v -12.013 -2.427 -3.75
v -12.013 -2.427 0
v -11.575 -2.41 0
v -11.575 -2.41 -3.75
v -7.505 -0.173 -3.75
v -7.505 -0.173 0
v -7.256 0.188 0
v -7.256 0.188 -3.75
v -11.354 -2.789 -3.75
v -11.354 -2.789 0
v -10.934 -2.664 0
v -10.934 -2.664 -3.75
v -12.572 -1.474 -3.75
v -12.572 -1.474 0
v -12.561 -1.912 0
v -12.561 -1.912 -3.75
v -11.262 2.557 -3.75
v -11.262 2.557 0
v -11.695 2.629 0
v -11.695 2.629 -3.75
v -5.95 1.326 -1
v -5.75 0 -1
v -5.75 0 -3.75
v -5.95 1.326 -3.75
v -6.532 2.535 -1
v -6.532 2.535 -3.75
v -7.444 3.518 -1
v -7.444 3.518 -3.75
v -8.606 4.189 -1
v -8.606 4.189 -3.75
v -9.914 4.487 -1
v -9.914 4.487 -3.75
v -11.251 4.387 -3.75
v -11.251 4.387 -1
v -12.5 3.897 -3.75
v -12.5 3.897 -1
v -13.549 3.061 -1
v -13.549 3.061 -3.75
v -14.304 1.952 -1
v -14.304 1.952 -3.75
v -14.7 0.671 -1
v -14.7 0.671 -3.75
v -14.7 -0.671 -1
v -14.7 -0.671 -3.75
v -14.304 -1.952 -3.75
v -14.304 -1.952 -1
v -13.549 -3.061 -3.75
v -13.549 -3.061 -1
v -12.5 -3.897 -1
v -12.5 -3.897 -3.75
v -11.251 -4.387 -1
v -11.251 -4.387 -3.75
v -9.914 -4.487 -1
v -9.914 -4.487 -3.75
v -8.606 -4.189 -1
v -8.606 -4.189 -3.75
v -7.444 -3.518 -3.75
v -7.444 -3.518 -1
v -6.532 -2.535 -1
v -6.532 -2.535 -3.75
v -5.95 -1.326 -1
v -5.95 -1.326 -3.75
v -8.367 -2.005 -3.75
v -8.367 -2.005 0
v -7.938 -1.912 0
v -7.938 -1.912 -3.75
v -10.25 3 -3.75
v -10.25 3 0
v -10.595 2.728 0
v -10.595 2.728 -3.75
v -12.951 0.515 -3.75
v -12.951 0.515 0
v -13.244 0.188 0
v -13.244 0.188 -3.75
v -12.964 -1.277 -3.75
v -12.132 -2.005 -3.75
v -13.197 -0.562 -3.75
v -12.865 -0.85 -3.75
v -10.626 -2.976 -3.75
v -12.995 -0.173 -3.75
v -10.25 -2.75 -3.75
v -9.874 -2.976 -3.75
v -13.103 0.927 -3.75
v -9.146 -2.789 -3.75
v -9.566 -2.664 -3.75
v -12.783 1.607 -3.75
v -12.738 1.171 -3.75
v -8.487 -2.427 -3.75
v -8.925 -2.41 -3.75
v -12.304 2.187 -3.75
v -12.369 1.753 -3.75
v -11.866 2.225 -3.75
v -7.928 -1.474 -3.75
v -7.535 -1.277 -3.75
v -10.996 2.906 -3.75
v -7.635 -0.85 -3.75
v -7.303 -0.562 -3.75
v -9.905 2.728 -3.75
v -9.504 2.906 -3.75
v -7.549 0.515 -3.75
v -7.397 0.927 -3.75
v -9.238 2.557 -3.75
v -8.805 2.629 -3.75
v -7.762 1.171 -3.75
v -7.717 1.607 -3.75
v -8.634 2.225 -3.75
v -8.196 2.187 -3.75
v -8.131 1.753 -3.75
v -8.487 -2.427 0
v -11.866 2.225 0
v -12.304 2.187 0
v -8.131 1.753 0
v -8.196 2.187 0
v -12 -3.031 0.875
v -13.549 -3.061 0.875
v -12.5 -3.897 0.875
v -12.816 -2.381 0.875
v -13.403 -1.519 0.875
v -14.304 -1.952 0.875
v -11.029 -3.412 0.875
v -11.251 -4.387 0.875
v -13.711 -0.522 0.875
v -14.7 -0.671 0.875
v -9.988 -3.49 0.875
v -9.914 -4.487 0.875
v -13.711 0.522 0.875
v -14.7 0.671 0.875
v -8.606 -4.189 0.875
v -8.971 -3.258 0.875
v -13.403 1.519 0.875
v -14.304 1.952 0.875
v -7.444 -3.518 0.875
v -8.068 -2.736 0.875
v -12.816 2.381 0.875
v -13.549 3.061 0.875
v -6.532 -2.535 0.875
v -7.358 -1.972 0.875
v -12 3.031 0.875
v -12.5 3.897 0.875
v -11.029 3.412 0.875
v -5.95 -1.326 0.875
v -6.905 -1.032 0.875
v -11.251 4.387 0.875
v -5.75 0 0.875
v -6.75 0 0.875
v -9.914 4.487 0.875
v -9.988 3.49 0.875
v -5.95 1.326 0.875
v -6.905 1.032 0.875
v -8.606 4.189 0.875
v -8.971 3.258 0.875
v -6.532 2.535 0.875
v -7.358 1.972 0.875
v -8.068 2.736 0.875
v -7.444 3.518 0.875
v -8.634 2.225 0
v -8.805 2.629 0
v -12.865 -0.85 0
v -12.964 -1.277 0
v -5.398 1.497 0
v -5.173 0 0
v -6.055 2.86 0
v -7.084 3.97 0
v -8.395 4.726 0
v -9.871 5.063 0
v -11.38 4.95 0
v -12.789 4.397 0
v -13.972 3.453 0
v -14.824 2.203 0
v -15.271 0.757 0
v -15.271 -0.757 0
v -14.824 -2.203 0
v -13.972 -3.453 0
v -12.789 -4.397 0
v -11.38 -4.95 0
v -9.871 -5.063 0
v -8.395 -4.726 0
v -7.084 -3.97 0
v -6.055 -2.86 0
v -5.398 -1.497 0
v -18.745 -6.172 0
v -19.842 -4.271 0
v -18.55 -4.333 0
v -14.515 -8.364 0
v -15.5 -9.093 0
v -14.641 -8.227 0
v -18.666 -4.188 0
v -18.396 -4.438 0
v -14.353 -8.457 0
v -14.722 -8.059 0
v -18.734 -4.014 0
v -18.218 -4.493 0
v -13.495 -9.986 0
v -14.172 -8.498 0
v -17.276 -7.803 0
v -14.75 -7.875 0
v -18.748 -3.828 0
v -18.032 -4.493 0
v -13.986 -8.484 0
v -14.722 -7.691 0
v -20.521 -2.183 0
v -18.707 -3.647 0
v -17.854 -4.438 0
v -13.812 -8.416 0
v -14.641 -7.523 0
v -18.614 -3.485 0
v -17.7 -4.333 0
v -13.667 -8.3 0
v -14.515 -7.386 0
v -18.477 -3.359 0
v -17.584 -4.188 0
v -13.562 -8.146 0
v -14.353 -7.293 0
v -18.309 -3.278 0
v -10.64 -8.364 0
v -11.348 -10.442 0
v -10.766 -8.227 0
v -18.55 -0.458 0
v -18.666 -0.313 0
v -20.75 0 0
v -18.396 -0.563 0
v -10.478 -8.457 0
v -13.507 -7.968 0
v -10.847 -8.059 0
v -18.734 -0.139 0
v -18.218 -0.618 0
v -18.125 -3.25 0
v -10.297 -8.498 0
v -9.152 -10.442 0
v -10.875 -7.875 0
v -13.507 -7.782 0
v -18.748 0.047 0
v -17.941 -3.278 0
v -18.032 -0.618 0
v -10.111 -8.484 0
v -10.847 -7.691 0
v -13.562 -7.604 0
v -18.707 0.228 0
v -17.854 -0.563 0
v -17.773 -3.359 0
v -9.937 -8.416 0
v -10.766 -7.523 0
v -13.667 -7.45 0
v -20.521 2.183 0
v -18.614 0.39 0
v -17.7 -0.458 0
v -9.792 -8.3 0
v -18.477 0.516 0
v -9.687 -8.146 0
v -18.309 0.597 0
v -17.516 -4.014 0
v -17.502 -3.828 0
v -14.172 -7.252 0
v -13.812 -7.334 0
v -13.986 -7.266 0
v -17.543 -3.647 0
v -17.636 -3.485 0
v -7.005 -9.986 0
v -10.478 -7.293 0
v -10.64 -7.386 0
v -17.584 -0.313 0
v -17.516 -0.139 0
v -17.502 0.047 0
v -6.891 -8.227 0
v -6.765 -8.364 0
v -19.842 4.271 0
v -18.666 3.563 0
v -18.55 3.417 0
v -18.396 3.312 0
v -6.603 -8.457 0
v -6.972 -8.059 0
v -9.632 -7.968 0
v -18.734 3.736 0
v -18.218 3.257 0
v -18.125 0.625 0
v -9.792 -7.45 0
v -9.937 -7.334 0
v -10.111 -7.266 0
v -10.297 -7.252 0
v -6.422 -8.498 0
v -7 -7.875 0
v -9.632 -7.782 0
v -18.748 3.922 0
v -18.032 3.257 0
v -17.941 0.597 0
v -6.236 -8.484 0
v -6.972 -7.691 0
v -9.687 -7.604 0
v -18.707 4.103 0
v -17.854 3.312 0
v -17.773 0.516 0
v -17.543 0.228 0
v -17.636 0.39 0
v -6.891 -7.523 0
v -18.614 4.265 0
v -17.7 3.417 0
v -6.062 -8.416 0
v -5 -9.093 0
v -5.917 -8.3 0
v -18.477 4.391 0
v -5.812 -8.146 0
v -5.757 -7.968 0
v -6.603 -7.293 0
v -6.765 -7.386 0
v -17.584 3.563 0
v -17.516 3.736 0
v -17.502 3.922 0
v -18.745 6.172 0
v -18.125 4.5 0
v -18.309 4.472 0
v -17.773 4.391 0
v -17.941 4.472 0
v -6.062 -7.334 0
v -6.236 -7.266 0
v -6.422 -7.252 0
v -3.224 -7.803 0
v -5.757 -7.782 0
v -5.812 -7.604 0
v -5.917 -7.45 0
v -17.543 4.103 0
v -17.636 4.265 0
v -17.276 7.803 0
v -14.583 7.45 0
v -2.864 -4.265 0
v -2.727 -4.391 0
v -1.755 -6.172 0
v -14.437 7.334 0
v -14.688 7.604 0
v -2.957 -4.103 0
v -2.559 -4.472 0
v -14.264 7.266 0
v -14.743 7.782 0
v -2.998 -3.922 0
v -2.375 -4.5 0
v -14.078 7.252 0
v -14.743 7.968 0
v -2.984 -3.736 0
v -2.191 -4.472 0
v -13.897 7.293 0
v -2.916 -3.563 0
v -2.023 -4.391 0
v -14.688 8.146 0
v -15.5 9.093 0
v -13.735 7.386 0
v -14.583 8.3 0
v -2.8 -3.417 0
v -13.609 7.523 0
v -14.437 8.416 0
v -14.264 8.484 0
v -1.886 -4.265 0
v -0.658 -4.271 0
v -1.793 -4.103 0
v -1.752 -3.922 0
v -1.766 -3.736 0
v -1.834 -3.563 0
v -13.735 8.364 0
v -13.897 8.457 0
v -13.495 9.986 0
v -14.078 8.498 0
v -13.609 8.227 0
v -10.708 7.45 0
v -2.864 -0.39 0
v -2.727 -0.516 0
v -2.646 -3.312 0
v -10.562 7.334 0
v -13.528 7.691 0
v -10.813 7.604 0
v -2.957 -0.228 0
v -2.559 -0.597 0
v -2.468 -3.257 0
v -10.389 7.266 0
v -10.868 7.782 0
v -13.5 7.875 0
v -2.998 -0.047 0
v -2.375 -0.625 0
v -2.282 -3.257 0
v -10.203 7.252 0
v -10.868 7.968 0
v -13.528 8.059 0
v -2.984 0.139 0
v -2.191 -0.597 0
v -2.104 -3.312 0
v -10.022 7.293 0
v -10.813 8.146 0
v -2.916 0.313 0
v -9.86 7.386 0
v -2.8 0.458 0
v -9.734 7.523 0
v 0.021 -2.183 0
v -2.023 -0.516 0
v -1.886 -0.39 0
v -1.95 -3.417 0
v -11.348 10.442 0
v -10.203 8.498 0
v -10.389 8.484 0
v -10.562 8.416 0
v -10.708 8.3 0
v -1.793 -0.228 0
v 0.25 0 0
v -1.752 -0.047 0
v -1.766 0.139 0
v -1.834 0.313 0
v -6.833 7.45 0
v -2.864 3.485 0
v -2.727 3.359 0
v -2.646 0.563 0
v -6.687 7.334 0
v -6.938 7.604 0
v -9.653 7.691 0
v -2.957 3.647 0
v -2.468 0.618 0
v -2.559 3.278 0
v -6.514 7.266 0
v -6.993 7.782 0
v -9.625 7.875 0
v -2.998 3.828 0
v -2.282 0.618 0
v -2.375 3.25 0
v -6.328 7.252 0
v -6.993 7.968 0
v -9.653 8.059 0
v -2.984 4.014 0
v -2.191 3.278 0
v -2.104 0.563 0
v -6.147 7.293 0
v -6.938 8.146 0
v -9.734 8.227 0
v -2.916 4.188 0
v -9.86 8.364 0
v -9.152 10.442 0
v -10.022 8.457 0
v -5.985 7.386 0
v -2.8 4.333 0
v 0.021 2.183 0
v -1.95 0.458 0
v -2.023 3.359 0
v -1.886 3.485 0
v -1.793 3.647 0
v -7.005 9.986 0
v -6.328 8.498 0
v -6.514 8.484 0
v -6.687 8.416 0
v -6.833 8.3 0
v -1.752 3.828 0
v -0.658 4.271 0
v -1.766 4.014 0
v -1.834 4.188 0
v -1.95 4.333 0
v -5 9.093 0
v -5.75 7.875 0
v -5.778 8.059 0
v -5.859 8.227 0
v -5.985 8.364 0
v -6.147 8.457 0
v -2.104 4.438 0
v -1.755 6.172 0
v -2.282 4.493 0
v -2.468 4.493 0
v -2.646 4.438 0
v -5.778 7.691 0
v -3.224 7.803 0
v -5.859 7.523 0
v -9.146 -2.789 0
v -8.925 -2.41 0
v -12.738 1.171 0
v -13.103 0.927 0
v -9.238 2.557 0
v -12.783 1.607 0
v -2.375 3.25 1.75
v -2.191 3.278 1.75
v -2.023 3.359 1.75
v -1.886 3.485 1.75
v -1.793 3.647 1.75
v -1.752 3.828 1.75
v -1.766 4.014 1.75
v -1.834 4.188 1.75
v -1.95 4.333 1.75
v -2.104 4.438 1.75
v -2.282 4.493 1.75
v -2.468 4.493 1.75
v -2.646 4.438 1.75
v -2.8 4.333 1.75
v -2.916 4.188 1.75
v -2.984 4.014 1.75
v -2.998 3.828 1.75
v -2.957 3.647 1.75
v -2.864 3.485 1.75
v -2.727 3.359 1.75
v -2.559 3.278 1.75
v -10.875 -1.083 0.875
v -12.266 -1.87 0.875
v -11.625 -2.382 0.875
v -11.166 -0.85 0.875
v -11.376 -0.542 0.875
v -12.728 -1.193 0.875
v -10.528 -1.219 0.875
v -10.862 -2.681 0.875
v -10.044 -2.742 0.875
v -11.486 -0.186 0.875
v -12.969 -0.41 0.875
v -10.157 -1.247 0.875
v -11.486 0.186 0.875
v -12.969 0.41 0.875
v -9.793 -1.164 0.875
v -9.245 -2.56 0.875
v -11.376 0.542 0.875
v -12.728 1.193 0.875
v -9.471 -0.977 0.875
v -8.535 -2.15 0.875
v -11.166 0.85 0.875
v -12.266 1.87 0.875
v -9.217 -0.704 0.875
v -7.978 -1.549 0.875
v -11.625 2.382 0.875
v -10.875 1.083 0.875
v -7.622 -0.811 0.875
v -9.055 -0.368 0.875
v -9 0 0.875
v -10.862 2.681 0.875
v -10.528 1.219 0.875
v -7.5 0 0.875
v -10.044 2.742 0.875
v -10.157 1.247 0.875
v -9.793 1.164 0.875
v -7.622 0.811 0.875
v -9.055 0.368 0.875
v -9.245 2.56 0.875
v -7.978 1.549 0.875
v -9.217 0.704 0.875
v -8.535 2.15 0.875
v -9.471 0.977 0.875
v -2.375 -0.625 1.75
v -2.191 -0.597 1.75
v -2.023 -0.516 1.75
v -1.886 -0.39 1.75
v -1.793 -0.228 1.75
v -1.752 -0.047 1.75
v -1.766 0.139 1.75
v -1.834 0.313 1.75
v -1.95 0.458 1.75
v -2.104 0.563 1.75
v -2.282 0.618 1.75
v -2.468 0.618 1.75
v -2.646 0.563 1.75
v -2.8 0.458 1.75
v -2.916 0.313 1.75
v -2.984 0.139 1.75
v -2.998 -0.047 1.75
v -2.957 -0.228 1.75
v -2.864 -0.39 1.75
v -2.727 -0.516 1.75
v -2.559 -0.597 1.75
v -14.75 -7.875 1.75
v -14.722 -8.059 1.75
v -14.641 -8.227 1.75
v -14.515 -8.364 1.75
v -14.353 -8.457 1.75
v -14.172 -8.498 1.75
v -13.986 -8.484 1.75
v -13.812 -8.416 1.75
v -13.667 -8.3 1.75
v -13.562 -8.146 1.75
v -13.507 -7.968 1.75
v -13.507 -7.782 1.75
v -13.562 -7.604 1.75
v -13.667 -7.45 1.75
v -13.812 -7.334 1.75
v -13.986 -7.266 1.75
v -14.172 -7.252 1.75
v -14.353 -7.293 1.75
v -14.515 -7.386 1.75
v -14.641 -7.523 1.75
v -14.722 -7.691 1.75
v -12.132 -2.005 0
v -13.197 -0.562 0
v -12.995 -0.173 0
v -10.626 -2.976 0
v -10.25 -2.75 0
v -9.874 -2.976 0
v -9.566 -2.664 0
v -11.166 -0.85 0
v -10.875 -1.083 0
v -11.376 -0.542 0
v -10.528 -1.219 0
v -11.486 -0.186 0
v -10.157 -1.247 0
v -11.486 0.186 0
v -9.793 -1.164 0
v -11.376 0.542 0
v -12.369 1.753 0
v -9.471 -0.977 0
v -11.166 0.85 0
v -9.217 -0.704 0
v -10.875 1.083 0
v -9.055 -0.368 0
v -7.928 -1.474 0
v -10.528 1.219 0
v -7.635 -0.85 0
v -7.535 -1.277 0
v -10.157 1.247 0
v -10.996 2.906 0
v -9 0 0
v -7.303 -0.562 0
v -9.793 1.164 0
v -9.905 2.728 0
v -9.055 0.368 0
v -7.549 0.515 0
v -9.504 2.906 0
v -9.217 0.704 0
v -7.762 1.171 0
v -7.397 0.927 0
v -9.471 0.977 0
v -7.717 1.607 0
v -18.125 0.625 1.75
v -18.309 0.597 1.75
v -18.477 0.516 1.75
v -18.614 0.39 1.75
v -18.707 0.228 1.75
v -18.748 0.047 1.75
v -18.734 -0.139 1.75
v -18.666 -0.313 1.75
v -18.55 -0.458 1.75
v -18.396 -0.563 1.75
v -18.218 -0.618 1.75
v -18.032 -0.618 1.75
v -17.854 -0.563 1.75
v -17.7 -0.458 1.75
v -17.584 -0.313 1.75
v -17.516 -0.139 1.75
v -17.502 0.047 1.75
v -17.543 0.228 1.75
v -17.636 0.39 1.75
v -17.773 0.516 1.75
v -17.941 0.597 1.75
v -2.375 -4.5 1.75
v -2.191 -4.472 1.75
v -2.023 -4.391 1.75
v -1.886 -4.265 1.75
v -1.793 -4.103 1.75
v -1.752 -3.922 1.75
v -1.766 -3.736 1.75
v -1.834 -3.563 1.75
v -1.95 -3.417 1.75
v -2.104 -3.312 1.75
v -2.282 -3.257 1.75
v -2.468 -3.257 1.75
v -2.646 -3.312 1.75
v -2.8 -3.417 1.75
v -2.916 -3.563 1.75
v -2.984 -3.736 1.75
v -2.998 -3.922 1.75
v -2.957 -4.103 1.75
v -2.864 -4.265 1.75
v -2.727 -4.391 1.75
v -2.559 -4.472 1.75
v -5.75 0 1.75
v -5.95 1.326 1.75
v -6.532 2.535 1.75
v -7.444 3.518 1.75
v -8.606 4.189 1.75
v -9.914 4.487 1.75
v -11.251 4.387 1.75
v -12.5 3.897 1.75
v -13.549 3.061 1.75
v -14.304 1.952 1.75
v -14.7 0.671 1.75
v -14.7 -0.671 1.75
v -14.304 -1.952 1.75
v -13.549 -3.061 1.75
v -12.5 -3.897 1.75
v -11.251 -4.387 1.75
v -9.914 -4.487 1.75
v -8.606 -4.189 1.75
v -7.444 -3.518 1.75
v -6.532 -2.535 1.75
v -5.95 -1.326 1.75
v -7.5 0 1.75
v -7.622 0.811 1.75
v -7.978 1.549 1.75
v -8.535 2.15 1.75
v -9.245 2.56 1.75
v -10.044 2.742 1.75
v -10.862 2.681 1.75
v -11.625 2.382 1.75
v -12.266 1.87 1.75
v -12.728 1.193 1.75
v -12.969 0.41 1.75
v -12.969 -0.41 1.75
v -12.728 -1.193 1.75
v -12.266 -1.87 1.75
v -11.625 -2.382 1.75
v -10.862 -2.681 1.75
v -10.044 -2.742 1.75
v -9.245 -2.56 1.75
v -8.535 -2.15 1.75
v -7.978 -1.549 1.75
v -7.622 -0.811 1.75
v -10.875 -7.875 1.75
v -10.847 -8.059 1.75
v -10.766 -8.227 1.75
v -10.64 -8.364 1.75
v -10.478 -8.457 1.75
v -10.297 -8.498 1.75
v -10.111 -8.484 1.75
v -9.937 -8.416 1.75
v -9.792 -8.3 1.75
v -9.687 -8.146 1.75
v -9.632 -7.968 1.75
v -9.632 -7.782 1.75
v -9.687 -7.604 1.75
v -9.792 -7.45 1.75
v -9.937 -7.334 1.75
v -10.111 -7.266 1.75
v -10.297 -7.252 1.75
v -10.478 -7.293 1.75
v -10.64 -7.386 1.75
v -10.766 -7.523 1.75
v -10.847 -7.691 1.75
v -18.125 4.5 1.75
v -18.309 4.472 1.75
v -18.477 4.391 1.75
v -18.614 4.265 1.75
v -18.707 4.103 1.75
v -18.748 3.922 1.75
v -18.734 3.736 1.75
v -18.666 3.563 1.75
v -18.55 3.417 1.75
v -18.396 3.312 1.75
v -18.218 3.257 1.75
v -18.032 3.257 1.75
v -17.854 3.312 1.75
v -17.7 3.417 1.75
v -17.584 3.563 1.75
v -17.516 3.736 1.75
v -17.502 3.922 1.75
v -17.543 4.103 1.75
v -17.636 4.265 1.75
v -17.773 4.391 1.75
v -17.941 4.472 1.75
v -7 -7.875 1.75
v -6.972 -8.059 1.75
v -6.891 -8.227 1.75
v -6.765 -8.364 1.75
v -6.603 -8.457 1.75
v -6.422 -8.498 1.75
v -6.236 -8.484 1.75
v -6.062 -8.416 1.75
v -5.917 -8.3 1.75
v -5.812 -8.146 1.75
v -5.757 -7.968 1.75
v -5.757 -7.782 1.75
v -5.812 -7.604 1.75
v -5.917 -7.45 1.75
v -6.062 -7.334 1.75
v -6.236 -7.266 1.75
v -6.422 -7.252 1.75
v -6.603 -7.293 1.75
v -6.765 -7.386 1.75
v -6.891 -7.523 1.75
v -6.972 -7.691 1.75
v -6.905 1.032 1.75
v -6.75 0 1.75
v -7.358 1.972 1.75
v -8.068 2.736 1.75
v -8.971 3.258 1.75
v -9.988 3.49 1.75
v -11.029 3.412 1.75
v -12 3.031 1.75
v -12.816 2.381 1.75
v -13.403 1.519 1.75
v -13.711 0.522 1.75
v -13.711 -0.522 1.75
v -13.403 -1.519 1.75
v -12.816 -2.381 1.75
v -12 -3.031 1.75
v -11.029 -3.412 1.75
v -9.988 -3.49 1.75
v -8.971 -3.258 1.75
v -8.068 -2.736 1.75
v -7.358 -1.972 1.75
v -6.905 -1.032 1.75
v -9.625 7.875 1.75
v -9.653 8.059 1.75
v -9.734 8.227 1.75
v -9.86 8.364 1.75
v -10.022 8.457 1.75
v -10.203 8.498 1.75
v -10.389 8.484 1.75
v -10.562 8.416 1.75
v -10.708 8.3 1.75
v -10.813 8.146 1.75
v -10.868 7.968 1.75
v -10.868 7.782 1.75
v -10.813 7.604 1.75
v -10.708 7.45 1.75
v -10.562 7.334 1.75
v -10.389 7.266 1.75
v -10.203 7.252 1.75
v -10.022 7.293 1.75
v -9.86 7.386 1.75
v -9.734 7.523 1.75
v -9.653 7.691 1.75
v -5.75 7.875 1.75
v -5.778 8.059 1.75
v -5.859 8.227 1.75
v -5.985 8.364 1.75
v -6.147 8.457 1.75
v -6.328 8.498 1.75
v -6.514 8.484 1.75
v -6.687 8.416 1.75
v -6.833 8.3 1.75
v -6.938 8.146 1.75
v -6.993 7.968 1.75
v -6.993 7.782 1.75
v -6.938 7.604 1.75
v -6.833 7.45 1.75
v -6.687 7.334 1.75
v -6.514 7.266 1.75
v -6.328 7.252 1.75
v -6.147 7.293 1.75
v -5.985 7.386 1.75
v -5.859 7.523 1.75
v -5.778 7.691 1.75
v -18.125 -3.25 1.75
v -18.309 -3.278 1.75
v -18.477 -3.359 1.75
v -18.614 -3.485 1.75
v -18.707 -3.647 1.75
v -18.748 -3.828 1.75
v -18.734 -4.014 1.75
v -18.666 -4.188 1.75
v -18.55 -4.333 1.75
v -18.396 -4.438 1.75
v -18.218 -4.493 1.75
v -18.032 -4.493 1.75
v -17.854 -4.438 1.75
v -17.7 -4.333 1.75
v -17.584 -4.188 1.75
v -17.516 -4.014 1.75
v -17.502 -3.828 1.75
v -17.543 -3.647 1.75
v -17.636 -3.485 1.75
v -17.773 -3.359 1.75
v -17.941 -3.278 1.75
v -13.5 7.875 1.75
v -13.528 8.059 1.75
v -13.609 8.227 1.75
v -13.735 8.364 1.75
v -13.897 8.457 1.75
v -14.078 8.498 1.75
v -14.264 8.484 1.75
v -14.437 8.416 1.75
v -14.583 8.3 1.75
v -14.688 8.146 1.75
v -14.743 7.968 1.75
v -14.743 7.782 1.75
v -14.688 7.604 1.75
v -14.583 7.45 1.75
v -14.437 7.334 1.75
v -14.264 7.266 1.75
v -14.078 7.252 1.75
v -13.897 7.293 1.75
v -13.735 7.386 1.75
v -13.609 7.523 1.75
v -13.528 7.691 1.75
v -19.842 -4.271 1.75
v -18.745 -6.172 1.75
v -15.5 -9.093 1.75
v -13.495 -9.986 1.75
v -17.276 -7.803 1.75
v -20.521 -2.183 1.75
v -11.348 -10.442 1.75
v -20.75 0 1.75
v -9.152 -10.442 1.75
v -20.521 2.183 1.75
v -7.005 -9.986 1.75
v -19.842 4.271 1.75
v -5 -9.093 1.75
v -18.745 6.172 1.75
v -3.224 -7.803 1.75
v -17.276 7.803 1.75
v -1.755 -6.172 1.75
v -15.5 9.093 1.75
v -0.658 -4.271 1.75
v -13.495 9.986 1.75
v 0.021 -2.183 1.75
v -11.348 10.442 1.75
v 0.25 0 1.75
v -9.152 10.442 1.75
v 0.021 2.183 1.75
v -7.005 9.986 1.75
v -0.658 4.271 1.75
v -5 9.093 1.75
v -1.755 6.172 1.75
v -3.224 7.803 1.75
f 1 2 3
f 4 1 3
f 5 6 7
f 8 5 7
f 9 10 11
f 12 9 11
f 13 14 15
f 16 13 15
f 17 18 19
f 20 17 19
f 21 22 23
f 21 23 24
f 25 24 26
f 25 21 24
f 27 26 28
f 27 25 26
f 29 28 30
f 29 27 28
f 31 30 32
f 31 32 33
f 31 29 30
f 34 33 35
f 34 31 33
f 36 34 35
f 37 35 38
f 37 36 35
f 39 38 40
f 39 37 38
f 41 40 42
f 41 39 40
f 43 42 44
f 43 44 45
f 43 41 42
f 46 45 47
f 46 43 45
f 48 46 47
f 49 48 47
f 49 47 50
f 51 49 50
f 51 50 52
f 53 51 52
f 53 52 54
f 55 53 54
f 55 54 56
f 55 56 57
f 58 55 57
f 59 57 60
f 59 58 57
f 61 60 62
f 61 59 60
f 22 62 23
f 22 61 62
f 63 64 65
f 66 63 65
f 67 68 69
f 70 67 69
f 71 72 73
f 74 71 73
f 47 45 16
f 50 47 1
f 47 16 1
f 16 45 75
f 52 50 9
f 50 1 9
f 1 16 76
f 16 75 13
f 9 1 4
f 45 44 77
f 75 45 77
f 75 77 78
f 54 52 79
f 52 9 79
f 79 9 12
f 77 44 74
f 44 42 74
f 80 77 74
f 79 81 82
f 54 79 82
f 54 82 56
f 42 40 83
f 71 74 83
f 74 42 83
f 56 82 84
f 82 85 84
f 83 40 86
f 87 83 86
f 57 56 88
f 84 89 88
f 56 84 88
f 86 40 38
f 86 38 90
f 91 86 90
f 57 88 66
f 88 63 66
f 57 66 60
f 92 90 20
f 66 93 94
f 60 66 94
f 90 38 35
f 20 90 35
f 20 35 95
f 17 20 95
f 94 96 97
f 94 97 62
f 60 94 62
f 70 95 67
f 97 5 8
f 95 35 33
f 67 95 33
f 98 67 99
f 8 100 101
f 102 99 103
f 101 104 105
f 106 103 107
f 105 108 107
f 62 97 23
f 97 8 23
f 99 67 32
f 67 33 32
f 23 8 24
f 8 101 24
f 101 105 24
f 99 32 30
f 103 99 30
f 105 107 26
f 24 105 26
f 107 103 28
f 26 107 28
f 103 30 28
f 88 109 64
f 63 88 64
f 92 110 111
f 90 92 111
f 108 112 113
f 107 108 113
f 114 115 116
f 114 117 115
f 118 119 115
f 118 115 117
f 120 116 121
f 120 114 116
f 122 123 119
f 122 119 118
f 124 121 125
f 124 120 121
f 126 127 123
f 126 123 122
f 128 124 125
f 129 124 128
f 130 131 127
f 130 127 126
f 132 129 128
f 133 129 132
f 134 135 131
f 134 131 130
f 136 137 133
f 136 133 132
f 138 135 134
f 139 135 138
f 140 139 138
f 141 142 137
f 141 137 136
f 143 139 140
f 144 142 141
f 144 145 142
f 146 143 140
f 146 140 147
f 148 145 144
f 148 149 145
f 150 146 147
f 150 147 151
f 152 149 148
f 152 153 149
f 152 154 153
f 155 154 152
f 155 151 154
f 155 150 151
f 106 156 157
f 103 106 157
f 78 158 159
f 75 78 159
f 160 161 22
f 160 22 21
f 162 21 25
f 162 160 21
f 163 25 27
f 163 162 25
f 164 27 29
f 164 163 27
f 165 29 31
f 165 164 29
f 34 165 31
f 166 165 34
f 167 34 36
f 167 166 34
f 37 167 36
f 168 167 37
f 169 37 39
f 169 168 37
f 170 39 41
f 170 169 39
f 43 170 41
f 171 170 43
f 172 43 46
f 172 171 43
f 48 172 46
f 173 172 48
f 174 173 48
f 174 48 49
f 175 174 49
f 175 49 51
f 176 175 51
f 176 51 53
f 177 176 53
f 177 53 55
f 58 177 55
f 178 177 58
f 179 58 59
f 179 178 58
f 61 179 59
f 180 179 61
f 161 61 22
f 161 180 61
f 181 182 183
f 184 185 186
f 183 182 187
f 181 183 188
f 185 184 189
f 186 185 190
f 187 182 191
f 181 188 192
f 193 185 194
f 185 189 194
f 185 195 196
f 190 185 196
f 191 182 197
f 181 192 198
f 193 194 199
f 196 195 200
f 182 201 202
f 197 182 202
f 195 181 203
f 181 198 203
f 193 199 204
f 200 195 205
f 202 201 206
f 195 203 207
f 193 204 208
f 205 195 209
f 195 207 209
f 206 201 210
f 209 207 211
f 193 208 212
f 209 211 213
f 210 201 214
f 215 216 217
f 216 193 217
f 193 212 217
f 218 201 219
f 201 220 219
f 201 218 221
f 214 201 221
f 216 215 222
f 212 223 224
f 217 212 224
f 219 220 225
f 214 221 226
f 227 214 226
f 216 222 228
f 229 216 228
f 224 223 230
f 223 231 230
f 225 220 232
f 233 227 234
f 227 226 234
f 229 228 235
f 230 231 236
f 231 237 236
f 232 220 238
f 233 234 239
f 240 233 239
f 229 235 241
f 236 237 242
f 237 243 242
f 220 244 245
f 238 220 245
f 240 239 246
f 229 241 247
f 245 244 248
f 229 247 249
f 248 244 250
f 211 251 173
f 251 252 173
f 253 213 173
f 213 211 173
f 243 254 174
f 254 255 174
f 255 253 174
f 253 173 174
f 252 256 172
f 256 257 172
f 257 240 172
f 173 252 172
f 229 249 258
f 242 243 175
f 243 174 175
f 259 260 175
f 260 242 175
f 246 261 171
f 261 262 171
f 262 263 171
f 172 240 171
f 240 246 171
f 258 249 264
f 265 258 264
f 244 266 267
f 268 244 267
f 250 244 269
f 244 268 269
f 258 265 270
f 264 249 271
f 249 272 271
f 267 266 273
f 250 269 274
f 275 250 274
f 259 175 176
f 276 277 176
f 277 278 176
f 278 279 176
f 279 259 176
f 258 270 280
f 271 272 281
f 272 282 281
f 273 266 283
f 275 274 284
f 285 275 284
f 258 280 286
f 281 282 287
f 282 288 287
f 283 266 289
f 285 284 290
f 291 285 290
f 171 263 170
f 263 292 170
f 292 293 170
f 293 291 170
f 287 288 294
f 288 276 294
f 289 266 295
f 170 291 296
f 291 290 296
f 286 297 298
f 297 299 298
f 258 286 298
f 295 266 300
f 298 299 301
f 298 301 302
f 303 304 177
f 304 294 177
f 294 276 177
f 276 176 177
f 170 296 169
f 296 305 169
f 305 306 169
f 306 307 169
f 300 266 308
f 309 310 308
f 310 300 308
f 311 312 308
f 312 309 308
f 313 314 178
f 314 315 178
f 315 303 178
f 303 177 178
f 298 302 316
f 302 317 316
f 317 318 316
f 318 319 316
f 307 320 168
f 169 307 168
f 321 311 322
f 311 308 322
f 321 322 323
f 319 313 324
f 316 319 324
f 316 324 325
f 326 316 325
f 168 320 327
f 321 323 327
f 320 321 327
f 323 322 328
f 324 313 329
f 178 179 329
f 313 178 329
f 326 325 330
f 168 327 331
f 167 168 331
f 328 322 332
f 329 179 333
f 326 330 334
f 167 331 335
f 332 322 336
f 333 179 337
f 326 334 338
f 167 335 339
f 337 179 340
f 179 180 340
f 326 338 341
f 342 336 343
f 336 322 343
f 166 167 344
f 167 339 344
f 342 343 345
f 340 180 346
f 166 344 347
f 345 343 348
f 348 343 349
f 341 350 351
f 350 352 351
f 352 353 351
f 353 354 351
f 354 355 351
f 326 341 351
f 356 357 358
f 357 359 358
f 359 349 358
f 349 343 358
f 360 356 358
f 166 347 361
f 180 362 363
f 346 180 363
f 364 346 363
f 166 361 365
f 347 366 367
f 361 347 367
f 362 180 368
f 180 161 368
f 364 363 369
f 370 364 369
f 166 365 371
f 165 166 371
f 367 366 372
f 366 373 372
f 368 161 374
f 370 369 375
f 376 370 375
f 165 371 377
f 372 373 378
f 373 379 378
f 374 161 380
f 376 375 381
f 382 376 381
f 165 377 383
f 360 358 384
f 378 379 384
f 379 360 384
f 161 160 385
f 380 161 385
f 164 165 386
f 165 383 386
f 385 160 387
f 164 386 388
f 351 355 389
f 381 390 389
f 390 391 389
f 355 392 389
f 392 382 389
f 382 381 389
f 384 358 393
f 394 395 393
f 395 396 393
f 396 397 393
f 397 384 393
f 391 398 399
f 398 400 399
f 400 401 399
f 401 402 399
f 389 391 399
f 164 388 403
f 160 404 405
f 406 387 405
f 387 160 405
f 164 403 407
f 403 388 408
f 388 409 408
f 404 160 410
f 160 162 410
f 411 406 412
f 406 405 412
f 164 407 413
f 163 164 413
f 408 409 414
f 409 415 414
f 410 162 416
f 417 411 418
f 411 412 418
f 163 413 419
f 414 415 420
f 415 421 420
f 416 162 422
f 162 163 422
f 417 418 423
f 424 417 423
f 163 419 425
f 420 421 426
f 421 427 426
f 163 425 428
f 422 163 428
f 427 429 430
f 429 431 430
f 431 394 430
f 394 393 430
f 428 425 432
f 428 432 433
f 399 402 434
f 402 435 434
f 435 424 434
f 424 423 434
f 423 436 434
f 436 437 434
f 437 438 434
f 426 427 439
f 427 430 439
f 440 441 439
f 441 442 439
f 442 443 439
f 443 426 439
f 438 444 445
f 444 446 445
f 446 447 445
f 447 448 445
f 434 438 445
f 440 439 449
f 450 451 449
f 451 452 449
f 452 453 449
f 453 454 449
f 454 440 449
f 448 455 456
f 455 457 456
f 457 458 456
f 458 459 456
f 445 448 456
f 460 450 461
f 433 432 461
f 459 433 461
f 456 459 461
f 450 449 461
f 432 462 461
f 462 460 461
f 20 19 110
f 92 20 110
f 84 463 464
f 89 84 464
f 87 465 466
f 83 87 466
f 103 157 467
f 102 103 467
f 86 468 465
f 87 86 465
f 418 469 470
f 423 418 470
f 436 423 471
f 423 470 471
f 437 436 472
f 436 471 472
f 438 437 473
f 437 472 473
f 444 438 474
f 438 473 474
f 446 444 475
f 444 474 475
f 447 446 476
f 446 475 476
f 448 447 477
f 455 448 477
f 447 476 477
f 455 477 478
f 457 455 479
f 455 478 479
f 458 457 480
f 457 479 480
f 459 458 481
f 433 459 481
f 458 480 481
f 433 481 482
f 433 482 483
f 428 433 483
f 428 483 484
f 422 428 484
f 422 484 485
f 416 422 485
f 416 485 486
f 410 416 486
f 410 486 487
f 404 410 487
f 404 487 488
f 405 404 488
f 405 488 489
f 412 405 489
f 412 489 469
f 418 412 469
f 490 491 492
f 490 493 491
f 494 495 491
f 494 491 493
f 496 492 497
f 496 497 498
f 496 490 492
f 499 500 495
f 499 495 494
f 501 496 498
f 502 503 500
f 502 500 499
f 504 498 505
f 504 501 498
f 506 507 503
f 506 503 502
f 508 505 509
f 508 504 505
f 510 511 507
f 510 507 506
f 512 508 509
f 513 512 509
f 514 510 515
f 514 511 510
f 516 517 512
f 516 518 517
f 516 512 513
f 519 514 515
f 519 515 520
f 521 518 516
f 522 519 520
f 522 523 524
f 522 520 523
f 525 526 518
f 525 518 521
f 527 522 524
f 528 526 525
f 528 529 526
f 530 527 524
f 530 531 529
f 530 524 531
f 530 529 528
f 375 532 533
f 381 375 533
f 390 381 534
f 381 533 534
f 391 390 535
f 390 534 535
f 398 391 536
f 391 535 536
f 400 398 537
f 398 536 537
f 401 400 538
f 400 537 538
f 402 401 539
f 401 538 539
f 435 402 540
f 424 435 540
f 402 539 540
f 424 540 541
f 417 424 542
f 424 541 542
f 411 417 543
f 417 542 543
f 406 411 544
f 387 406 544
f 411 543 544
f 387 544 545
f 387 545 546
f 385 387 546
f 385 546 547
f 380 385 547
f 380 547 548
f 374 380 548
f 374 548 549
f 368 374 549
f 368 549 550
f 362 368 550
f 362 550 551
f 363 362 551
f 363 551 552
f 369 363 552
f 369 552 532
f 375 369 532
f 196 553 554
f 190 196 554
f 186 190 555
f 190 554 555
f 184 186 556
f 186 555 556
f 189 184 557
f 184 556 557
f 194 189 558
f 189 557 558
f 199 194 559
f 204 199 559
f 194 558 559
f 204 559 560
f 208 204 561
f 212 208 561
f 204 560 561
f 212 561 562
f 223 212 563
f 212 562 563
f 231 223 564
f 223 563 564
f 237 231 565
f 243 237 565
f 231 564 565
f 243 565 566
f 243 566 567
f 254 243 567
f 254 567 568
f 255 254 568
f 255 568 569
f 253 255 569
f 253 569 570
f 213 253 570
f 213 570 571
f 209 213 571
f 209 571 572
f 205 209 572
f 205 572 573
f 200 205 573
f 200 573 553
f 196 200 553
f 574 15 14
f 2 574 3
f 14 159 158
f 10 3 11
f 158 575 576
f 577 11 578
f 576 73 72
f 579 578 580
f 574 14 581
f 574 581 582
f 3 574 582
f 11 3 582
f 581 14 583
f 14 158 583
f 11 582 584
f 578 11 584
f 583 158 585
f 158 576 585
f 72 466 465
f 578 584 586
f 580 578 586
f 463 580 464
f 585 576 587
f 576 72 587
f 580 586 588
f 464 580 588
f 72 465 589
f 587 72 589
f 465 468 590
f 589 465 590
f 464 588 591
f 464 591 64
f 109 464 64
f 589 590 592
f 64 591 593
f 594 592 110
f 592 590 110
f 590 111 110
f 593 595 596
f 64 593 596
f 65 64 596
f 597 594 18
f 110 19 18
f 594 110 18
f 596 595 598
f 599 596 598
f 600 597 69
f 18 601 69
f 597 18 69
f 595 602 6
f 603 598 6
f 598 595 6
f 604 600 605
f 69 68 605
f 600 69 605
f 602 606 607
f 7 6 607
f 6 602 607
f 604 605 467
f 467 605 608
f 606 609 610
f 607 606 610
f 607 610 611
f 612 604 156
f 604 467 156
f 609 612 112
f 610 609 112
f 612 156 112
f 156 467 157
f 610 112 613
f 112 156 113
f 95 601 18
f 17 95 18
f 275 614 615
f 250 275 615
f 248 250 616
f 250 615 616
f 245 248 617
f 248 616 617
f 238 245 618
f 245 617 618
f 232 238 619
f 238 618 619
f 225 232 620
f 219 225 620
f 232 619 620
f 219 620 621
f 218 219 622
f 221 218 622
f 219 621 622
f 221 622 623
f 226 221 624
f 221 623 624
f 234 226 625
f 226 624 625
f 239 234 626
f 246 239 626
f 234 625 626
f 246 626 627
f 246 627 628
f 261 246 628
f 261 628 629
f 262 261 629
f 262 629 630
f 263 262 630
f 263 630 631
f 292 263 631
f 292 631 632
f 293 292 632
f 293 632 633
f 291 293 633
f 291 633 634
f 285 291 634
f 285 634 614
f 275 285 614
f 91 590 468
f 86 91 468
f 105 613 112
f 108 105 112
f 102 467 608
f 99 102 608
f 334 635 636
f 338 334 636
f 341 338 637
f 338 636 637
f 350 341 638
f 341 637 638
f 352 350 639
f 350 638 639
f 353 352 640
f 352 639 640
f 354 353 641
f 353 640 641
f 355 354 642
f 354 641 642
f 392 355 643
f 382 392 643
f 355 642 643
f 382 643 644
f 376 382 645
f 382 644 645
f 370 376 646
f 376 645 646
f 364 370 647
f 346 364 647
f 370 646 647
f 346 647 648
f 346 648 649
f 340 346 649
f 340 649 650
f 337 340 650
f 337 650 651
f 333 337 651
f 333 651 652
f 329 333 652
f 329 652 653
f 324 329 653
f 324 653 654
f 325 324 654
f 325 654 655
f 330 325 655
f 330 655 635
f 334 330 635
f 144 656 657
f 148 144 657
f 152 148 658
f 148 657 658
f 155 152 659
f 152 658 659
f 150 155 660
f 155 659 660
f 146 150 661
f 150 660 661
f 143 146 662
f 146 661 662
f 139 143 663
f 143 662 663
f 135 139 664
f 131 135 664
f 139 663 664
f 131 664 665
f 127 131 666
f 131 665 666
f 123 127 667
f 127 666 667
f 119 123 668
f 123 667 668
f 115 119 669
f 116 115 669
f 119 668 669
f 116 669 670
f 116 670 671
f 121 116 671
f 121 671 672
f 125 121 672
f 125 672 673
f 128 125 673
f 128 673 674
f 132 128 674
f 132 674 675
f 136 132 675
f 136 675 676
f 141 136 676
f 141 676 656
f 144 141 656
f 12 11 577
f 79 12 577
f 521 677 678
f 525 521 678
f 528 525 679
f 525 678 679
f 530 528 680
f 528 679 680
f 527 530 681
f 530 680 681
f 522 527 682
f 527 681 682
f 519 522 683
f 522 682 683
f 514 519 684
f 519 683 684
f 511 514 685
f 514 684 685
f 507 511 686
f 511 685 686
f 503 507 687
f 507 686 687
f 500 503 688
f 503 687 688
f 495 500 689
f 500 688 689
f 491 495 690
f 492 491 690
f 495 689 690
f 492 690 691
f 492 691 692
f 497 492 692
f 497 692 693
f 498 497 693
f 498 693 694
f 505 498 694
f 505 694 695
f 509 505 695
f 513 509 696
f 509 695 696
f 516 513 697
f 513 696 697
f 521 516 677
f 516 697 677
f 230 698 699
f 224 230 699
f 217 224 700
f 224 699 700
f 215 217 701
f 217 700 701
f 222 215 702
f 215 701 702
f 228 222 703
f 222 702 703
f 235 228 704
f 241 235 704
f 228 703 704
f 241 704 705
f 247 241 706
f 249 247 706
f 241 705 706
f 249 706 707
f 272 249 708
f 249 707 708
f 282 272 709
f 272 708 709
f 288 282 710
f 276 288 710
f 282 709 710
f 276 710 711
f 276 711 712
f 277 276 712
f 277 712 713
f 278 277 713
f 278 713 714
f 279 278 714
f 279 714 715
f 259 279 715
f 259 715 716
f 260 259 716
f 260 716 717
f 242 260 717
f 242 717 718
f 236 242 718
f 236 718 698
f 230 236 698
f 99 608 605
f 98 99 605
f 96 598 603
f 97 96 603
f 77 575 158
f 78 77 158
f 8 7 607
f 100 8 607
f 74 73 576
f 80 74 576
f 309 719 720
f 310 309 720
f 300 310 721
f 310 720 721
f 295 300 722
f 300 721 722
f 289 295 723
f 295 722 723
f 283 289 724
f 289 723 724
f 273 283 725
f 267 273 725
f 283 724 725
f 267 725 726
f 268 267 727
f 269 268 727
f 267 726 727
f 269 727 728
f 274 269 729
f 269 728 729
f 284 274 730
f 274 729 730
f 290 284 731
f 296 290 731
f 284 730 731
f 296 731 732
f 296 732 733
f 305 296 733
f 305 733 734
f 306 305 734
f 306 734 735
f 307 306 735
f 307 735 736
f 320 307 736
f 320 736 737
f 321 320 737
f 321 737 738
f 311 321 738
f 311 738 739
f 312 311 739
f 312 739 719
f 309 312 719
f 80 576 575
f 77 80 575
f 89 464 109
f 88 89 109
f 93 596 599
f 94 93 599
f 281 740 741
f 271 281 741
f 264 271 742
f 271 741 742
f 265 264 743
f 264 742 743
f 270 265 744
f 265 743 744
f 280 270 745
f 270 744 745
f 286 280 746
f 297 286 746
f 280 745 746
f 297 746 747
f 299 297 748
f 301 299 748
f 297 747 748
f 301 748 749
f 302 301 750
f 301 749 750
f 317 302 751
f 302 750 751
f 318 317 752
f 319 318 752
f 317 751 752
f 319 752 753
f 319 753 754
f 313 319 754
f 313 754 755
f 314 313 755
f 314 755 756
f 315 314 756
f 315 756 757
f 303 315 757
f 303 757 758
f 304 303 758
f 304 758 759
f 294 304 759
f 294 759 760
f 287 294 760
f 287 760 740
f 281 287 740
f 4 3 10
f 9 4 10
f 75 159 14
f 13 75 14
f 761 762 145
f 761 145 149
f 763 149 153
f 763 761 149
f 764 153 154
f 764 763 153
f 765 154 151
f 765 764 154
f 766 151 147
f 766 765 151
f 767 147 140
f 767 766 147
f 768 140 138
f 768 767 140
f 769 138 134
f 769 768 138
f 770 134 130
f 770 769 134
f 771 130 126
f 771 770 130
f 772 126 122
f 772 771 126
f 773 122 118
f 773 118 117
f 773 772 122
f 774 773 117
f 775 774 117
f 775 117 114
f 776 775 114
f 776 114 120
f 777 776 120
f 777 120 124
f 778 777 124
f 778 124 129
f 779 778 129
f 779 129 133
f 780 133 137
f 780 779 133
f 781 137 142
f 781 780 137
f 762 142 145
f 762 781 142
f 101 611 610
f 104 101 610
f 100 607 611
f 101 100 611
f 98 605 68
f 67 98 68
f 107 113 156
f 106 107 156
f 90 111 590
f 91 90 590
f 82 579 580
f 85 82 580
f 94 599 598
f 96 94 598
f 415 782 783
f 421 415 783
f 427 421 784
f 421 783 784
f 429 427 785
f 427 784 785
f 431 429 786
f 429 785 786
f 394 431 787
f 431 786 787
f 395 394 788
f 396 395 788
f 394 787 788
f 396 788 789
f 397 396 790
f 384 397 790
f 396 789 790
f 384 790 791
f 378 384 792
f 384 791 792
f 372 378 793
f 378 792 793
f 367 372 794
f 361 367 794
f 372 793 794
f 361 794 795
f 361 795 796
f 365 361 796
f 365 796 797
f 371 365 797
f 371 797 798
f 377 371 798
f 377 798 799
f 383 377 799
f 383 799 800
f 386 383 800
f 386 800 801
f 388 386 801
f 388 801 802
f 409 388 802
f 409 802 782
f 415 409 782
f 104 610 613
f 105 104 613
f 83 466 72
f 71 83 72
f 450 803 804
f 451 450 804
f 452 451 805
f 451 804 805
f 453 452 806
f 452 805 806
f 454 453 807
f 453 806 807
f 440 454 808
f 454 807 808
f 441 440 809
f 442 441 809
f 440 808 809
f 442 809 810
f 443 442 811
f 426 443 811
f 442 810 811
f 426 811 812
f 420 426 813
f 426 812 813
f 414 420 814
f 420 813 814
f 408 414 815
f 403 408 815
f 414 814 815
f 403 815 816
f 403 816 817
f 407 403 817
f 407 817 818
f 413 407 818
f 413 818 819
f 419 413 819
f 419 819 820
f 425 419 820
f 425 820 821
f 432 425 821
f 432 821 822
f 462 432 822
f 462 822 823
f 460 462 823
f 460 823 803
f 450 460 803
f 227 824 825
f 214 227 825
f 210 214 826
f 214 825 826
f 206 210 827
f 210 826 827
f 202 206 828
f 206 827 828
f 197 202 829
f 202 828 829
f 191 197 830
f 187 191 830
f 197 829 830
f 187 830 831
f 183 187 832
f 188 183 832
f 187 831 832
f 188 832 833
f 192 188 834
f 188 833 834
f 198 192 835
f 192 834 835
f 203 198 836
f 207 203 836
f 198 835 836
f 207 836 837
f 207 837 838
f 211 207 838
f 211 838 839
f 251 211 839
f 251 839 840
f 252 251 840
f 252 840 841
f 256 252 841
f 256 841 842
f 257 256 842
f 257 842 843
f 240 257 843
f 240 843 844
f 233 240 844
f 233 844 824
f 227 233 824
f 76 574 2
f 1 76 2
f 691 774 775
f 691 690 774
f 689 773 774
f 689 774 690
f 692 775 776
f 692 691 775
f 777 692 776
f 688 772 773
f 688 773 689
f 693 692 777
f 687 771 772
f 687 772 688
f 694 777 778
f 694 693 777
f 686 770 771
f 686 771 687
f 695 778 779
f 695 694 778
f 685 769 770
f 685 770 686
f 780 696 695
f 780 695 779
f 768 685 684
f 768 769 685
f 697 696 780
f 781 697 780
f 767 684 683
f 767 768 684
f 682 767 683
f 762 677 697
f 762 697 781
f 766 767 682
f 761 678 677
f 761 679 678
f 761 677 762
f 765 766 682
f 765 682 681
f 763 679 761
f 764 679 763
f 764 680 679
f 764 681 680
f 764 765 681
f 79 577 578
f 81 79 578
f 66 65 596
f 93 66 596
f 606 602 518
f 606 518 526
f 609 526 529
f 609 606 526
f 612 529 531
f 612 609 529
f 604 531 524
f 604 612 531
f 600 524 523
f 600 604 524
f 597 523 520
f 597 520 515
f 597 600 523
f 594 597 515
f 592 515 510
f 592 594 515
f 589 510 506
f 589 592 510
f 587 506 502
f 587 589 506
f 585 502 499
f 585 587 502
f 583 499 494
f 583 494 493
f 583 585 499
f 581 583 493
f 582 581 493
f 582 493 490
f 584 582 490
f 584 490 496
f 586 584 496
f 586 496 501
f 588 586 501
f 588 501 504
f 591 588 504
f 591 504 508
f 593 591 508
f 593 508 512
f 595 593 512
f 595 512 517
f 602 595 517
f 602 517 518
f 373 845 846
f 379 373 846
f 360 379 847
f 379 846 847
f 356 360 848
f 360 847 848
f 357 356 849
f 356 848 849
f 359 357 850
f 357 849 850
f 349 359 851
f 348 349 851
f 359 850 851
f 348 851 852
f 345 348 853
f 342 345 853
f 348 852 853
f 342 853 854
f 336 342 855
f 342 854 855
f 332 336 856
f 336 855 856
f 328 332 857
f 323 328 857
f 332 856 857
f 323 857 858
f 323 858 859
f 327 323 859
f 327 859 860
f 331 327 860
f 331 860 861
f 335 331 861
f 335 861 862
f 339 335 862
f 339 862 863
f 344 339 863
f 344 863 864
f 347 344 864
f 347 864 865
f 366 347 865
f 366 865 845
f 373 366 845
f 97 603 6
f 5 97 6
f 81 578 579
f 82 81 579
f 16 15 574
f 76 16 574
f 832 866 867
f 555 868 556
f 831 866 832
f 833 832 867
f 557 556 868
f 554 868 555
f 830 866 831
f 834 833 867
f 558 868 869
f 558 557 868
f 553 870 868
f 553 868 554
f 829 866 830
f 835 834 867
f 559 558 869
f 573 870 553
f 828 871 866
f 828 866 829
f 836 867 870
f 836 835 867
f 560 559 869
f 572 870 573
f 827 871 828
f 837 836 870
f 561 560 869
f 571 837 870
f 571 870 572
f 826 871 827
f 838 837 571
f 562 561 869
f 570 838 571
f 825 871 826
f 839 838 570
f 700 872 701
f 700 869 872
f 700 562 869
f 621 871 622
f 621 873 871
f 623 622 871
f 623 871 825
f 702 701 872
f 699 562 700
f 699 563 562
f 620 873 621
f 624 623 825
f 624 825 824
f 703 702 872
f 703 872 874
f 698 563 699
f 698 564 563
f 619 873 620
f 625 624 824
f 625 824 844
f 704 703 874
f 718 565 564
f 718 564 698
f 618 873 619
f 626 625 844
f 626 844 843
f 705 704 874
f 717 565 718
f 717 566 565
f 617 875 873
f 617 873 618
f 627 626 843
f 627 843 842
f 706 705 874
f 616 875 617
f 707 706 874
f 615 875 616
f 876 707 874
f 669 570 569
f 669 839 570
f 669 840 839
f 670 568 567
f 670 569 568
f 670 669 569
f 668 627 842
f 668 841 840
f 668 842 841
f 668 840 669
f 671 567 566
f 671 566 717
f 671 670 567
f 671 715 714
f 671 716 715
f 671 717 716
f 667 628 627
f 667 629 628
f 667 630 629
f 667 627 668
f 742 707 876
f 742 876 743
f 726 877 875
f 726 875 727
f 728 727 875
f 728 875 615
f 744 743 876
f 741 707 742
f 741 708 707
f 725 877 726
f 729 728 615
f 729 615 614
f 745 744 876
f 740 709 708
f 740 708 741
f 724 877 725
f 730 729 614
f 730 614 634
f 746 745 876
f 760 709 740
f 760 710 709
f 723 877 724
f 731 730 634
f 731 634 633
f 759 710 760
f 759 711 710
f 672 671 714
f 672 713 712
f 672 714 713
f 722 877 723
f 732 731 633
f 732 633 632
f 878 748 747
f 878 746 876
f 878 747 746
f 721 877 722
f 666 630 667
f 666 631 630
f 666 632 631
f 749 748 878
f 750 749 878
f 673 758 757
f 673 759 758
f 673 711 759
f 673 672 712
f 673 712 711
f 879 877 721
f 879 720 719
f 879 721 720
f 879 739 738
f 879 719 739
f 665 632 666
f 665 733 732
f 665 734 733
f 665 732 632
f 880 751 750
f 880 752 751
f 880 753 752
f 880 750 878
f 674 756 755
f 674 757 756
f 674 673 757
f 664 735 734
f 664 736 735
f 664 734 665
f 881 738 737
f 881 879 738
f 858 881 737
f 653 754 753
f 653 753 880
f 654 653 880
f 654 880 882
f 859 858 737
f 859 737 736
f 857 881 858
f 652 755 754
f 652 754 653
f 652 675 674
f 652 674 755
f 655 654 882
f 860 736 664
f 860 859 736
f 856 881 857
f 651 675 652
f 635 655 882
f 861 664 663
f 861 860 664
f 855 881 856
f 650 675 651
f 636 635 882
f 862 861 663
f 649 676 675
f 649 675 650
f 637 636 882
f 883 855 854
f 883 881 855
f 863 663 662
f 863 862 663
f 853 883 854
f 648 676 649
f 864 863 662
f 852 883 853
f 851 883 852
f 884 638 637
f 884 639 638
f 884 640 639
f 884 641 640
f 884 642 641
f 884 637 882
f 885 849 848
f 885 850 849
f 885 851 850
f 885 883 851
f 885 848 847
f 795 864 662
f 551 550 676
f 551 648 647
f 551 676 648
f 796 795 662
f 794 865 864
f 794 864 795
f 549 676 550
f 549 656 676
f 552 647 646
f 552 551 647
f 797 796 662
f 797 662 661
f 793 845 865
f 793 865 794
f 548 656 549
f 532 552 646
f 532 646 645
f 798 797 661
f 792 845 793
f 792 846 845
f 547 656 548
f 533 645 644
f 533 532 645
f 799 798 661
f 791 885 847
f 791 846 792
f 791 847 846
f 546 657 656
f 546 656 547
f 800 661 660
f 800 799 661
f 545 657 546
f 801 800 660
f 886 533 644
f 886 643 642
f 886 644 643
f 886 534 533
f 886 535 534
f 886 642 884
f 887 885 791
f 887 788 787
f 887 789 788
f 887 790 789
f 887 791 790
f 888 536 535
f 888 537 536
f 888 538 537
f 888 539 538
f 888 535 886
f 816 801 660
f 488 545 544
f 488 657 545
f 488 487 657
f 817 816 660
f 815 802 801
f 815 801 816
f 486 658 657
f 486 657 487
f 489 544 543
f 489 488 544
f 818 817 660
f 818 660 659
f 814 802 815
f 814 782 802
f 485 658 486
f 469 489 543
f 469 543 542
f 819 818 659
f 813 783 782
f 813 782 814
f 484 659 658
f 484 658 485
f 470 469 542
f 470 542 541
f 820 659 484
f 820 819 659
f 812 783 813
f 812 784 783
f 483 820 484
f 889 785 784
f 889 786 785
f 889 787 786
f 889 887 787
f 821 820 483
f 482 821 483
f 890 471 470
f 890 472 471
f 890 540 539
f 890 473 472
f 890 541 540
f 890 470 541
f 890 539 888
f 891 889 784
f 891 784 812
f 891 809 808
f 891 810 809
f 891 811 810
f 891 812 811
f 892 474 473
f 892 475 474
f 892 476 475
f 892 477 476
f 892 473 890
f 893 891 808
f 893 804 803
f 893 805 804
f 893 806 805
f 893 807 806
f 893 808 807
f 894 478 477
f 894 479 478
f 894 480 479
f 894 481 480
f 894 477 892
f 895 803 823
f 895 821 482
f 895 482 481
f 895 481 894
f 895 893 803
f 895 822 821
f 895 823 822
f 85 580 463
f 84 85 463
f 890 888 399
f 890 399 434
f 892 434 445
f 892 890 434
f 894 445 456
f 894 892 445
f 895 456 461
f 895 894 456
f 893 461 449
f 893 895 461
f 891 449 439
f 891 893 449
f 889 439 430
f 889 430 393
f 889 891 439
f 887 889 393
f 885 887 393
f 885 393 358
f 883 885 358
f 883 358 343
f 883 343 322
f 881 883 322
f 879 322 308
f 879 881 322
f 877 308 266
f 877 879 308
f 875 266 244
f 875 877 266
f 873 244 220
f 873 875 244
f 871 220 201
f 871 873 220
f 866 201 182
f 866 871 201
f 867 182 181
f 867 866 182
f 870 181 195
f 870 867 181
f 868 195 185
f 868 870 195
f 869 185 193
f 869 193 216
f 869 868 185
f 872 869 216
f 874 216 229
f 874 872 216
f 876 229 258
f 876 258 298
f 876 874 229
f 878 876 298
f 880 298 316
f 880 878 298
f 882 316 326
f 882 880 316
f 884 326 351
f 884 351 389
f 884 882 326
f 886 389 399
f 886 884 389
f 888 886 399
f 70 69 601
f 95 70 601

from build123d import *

# Parameters (mm, degrees)
SKETCH1_R           = 4.5000037
BOSS_EXTRUDE1_DEPTH = 3.75000012
SKETCH2_R           = 4.5000037
SKETCH2_R_2         = 3.499999998
SKETCH2_R_3         = 1.25000004
BOSS_EXTRUDE2_DEPTH = 1.750000056
SKETCH4_R           = 2.75000466
SKETCH4_R_2         = 1.25000004
CUT_EXTRUDE1_DEPTH  = 0.875000028
SKETCH6_R           = 4.5000037
SKETCH6_R_2         = 3.5000057
CUT_EXTRUDE2_DEPTH  = 0.875000028
SKETCH7_R           = 10.5000044
SKETCH7_R_2         = 4.5000037
BOSS_EXTRUDE3_DEPTH = 1.750000056
SKETCH9_R           = 0.62500002
CUT_EXTRUDE3_DEPTH  = 6.500000176
CIRPATTERN1_COUNT   = 4
CHAMFER1_SIZE       = 0.999998
CHAMFER1_SIZE2      = 0.577349114


with BuildPart() as part:
    # Sketch1 → Boss-Extrude1 (new body)
    with BuildSketch(Plane.XY):
        with Locations((-10.24995918, 0)):
            Circle(SKETCH1_R)
        Polygon((-10.24995918, 2.999994), (-10.594624819, 2.728309468), (-10.996027349, 2.905743672), (-11.262299488, 2.55687975), (-11.695217312, 2.628914782), (-11.866365092, 2.224791874), (-12.303596391, 2.186901508), (-12.368865968, 1.752912142), (-12.782937891, 1.60747717), (-12.738228138, 1.170890494), (-13.103123023, 0.927049129), (-12.951243218, 0.515297489), (-13.244033377, 0.188371182), (-12.994526687, -0.172673551), (-13.196815038, -0.562142819), (-12.865358886, -0.849794878), (-12.964434908, -1.27733532), (-12.571855902, -1.473520467), (-12.561494285, -1.912268145), (-12.132459609, -2.004659346), (-12.01331141, -2.427046129), (-11.574778889, -2.409838105), (-11.354330629, -2.789323879), (-10.933854876, -2.663597874), (-10.625958129, -2.976338151), (-10.24995918, -2.749993992), (-9.873960231, -2.976338151), (-9.566063484, -2.663597874), (-9.145587731, -2.789323879), (-8.925139471, -2.409838105), (-8.48660695, -2.427046129), (-8.367458751, -2.004659346), (-7.938424075, -1.912268145), (-7.928062458, -1.473520467), (-7.535483452, -1.27733532), (-7.634559474, -0.849794878), (-7.303103322, -0.562142819), (-7.505391673, -0.172673551), (-7.255884983, 0.188371182), (-7.548675142, 0.515297489), (-7.396795337, 0.927049129), (-7.761690222, 1.170890494), (-7.716980469, 1.60747717), (-8.131052392, 1.752912142), (-8.196321969, 2.186901508), (-8.633553268, 2.224791874), (-8.804701048, 2.628914782), (-9.237618872, 2.55687975), (-9.503891011, 2.905743672), (-9.905293541, 2.728309468), align=None, mode=Mode.SUBTRACT)
    extrude(amount=-BOSS_EXTRUDE1_DEPTH)

    # Sketch2 → Boss-Extrude2 (add)
    with BuildSketch(Plane.XY):
        with Locations((-10.24995918, 0)):
            Circle(SKETCH2_R)
        with Locations((-10.24995918, 0)):
            Circle(SKETCH2_R_2, mode=Mode.SUBTRACT)
        with Locations((-10.24995918, 0)):
            Circle(SKETCH2_R_2)
        with Locations((-10.24995918, 0)):
            Circle(SKETCH2_R_3, mode=Mode.SUBTRACT)
    extrude(amount=BOSS_EXTRUDE2_DEPTH)

    # Sketch4 → Cut-Extrude1 (cut)
    with BuildSketch(Plane.XY.offset(1.750000056)):
        with Locations((-10.24995918, 0)):
            Circle(SKETCH4_R)
        with Locations((-10.24995918, 0)):
            Circle(SKETCH4_R_2, mode=Mode.SUBTRACT)
    extrude(amount=-CUT_EXTRUDE1_DEPTH, mode=Mode.SUBTRACT)

    # Sketch6 → Cut-Extrude2 (cut)
    with BuildSketch(Plane.XY.offset(1.750000056)):
        with Locations((-10.24995918, 0)):
            Circle(SKETCH6_R)
        with Locations((-10.24995918, 0)):
            Circle(SKETCH6_R_2, mode=Mode.SUBTRACT)
    extrude(amount=-CUT_EXTRUDE2_DEPTH, mode=Mode.SUBTRACT)

    # Sketch7 → Boss-Extrude3 (add)
    with BuildSketch(Plane.XY.offset(1.750000056)):
        with Locations((-10.24995918, 0)):
            Circle(SKETCH7_R)
        with Locations((-10.24995918, 0)):
            Circle(SKETCH7_R_2, mode=Mode.SUBTRACT)
    extrude(amount=-BOSS_EXTRUDE3_DEPTH)

    # Sketch9 → Cut-Extrude3 (cut, through all)
    with BuildSketch(Plane.XY.offset(1.750000056)):
        with Locations((-10.24995918, 7.8750033)):
            Circle(SKETCH9_R)
        with Locations((-14.124959304, 7.8750033)):
            Circle(SKETCH9_R)
        with Locations((-6.374959056, 7.8750033)):
            Circle(SKETCH9_R)
    cut_extrude3 = extrude(amount=-CUT_EXTRUDE3_DEPTH, mode=Mode.SUBTRACT)

    # CirPattern1: Cut-Extrude3 ×4 about axis
    cirpattern1_axis = Axis((-10.24995918, 0, 0), (0, 0, 1))
    for i in range(1, CIRPATTERN1_COUNT):
        add(cut_extrude3.rotate(cirpattern1_axis, i * 360 / CIRPATTERN1_COUNT), mode=Mode.SUBTRACT)

    # Chamfer1
    chamfer1_edges = [part.edges().sort_by_distance(p)[0] for p in [
        (-14.74996288, 0, 0),
    ]]
    chamfer1_side = [part.faces().sort_by_distance(p)[0] for p in [
        (-14.74996288, 0, -1.87500006),
    ]]
    chamfer(chamfer1_edges, length=CHAMFER1_SIZE, length2=CHAMFER1_SIZE2, reference=chamfer1_side[0])


solid = part.part
